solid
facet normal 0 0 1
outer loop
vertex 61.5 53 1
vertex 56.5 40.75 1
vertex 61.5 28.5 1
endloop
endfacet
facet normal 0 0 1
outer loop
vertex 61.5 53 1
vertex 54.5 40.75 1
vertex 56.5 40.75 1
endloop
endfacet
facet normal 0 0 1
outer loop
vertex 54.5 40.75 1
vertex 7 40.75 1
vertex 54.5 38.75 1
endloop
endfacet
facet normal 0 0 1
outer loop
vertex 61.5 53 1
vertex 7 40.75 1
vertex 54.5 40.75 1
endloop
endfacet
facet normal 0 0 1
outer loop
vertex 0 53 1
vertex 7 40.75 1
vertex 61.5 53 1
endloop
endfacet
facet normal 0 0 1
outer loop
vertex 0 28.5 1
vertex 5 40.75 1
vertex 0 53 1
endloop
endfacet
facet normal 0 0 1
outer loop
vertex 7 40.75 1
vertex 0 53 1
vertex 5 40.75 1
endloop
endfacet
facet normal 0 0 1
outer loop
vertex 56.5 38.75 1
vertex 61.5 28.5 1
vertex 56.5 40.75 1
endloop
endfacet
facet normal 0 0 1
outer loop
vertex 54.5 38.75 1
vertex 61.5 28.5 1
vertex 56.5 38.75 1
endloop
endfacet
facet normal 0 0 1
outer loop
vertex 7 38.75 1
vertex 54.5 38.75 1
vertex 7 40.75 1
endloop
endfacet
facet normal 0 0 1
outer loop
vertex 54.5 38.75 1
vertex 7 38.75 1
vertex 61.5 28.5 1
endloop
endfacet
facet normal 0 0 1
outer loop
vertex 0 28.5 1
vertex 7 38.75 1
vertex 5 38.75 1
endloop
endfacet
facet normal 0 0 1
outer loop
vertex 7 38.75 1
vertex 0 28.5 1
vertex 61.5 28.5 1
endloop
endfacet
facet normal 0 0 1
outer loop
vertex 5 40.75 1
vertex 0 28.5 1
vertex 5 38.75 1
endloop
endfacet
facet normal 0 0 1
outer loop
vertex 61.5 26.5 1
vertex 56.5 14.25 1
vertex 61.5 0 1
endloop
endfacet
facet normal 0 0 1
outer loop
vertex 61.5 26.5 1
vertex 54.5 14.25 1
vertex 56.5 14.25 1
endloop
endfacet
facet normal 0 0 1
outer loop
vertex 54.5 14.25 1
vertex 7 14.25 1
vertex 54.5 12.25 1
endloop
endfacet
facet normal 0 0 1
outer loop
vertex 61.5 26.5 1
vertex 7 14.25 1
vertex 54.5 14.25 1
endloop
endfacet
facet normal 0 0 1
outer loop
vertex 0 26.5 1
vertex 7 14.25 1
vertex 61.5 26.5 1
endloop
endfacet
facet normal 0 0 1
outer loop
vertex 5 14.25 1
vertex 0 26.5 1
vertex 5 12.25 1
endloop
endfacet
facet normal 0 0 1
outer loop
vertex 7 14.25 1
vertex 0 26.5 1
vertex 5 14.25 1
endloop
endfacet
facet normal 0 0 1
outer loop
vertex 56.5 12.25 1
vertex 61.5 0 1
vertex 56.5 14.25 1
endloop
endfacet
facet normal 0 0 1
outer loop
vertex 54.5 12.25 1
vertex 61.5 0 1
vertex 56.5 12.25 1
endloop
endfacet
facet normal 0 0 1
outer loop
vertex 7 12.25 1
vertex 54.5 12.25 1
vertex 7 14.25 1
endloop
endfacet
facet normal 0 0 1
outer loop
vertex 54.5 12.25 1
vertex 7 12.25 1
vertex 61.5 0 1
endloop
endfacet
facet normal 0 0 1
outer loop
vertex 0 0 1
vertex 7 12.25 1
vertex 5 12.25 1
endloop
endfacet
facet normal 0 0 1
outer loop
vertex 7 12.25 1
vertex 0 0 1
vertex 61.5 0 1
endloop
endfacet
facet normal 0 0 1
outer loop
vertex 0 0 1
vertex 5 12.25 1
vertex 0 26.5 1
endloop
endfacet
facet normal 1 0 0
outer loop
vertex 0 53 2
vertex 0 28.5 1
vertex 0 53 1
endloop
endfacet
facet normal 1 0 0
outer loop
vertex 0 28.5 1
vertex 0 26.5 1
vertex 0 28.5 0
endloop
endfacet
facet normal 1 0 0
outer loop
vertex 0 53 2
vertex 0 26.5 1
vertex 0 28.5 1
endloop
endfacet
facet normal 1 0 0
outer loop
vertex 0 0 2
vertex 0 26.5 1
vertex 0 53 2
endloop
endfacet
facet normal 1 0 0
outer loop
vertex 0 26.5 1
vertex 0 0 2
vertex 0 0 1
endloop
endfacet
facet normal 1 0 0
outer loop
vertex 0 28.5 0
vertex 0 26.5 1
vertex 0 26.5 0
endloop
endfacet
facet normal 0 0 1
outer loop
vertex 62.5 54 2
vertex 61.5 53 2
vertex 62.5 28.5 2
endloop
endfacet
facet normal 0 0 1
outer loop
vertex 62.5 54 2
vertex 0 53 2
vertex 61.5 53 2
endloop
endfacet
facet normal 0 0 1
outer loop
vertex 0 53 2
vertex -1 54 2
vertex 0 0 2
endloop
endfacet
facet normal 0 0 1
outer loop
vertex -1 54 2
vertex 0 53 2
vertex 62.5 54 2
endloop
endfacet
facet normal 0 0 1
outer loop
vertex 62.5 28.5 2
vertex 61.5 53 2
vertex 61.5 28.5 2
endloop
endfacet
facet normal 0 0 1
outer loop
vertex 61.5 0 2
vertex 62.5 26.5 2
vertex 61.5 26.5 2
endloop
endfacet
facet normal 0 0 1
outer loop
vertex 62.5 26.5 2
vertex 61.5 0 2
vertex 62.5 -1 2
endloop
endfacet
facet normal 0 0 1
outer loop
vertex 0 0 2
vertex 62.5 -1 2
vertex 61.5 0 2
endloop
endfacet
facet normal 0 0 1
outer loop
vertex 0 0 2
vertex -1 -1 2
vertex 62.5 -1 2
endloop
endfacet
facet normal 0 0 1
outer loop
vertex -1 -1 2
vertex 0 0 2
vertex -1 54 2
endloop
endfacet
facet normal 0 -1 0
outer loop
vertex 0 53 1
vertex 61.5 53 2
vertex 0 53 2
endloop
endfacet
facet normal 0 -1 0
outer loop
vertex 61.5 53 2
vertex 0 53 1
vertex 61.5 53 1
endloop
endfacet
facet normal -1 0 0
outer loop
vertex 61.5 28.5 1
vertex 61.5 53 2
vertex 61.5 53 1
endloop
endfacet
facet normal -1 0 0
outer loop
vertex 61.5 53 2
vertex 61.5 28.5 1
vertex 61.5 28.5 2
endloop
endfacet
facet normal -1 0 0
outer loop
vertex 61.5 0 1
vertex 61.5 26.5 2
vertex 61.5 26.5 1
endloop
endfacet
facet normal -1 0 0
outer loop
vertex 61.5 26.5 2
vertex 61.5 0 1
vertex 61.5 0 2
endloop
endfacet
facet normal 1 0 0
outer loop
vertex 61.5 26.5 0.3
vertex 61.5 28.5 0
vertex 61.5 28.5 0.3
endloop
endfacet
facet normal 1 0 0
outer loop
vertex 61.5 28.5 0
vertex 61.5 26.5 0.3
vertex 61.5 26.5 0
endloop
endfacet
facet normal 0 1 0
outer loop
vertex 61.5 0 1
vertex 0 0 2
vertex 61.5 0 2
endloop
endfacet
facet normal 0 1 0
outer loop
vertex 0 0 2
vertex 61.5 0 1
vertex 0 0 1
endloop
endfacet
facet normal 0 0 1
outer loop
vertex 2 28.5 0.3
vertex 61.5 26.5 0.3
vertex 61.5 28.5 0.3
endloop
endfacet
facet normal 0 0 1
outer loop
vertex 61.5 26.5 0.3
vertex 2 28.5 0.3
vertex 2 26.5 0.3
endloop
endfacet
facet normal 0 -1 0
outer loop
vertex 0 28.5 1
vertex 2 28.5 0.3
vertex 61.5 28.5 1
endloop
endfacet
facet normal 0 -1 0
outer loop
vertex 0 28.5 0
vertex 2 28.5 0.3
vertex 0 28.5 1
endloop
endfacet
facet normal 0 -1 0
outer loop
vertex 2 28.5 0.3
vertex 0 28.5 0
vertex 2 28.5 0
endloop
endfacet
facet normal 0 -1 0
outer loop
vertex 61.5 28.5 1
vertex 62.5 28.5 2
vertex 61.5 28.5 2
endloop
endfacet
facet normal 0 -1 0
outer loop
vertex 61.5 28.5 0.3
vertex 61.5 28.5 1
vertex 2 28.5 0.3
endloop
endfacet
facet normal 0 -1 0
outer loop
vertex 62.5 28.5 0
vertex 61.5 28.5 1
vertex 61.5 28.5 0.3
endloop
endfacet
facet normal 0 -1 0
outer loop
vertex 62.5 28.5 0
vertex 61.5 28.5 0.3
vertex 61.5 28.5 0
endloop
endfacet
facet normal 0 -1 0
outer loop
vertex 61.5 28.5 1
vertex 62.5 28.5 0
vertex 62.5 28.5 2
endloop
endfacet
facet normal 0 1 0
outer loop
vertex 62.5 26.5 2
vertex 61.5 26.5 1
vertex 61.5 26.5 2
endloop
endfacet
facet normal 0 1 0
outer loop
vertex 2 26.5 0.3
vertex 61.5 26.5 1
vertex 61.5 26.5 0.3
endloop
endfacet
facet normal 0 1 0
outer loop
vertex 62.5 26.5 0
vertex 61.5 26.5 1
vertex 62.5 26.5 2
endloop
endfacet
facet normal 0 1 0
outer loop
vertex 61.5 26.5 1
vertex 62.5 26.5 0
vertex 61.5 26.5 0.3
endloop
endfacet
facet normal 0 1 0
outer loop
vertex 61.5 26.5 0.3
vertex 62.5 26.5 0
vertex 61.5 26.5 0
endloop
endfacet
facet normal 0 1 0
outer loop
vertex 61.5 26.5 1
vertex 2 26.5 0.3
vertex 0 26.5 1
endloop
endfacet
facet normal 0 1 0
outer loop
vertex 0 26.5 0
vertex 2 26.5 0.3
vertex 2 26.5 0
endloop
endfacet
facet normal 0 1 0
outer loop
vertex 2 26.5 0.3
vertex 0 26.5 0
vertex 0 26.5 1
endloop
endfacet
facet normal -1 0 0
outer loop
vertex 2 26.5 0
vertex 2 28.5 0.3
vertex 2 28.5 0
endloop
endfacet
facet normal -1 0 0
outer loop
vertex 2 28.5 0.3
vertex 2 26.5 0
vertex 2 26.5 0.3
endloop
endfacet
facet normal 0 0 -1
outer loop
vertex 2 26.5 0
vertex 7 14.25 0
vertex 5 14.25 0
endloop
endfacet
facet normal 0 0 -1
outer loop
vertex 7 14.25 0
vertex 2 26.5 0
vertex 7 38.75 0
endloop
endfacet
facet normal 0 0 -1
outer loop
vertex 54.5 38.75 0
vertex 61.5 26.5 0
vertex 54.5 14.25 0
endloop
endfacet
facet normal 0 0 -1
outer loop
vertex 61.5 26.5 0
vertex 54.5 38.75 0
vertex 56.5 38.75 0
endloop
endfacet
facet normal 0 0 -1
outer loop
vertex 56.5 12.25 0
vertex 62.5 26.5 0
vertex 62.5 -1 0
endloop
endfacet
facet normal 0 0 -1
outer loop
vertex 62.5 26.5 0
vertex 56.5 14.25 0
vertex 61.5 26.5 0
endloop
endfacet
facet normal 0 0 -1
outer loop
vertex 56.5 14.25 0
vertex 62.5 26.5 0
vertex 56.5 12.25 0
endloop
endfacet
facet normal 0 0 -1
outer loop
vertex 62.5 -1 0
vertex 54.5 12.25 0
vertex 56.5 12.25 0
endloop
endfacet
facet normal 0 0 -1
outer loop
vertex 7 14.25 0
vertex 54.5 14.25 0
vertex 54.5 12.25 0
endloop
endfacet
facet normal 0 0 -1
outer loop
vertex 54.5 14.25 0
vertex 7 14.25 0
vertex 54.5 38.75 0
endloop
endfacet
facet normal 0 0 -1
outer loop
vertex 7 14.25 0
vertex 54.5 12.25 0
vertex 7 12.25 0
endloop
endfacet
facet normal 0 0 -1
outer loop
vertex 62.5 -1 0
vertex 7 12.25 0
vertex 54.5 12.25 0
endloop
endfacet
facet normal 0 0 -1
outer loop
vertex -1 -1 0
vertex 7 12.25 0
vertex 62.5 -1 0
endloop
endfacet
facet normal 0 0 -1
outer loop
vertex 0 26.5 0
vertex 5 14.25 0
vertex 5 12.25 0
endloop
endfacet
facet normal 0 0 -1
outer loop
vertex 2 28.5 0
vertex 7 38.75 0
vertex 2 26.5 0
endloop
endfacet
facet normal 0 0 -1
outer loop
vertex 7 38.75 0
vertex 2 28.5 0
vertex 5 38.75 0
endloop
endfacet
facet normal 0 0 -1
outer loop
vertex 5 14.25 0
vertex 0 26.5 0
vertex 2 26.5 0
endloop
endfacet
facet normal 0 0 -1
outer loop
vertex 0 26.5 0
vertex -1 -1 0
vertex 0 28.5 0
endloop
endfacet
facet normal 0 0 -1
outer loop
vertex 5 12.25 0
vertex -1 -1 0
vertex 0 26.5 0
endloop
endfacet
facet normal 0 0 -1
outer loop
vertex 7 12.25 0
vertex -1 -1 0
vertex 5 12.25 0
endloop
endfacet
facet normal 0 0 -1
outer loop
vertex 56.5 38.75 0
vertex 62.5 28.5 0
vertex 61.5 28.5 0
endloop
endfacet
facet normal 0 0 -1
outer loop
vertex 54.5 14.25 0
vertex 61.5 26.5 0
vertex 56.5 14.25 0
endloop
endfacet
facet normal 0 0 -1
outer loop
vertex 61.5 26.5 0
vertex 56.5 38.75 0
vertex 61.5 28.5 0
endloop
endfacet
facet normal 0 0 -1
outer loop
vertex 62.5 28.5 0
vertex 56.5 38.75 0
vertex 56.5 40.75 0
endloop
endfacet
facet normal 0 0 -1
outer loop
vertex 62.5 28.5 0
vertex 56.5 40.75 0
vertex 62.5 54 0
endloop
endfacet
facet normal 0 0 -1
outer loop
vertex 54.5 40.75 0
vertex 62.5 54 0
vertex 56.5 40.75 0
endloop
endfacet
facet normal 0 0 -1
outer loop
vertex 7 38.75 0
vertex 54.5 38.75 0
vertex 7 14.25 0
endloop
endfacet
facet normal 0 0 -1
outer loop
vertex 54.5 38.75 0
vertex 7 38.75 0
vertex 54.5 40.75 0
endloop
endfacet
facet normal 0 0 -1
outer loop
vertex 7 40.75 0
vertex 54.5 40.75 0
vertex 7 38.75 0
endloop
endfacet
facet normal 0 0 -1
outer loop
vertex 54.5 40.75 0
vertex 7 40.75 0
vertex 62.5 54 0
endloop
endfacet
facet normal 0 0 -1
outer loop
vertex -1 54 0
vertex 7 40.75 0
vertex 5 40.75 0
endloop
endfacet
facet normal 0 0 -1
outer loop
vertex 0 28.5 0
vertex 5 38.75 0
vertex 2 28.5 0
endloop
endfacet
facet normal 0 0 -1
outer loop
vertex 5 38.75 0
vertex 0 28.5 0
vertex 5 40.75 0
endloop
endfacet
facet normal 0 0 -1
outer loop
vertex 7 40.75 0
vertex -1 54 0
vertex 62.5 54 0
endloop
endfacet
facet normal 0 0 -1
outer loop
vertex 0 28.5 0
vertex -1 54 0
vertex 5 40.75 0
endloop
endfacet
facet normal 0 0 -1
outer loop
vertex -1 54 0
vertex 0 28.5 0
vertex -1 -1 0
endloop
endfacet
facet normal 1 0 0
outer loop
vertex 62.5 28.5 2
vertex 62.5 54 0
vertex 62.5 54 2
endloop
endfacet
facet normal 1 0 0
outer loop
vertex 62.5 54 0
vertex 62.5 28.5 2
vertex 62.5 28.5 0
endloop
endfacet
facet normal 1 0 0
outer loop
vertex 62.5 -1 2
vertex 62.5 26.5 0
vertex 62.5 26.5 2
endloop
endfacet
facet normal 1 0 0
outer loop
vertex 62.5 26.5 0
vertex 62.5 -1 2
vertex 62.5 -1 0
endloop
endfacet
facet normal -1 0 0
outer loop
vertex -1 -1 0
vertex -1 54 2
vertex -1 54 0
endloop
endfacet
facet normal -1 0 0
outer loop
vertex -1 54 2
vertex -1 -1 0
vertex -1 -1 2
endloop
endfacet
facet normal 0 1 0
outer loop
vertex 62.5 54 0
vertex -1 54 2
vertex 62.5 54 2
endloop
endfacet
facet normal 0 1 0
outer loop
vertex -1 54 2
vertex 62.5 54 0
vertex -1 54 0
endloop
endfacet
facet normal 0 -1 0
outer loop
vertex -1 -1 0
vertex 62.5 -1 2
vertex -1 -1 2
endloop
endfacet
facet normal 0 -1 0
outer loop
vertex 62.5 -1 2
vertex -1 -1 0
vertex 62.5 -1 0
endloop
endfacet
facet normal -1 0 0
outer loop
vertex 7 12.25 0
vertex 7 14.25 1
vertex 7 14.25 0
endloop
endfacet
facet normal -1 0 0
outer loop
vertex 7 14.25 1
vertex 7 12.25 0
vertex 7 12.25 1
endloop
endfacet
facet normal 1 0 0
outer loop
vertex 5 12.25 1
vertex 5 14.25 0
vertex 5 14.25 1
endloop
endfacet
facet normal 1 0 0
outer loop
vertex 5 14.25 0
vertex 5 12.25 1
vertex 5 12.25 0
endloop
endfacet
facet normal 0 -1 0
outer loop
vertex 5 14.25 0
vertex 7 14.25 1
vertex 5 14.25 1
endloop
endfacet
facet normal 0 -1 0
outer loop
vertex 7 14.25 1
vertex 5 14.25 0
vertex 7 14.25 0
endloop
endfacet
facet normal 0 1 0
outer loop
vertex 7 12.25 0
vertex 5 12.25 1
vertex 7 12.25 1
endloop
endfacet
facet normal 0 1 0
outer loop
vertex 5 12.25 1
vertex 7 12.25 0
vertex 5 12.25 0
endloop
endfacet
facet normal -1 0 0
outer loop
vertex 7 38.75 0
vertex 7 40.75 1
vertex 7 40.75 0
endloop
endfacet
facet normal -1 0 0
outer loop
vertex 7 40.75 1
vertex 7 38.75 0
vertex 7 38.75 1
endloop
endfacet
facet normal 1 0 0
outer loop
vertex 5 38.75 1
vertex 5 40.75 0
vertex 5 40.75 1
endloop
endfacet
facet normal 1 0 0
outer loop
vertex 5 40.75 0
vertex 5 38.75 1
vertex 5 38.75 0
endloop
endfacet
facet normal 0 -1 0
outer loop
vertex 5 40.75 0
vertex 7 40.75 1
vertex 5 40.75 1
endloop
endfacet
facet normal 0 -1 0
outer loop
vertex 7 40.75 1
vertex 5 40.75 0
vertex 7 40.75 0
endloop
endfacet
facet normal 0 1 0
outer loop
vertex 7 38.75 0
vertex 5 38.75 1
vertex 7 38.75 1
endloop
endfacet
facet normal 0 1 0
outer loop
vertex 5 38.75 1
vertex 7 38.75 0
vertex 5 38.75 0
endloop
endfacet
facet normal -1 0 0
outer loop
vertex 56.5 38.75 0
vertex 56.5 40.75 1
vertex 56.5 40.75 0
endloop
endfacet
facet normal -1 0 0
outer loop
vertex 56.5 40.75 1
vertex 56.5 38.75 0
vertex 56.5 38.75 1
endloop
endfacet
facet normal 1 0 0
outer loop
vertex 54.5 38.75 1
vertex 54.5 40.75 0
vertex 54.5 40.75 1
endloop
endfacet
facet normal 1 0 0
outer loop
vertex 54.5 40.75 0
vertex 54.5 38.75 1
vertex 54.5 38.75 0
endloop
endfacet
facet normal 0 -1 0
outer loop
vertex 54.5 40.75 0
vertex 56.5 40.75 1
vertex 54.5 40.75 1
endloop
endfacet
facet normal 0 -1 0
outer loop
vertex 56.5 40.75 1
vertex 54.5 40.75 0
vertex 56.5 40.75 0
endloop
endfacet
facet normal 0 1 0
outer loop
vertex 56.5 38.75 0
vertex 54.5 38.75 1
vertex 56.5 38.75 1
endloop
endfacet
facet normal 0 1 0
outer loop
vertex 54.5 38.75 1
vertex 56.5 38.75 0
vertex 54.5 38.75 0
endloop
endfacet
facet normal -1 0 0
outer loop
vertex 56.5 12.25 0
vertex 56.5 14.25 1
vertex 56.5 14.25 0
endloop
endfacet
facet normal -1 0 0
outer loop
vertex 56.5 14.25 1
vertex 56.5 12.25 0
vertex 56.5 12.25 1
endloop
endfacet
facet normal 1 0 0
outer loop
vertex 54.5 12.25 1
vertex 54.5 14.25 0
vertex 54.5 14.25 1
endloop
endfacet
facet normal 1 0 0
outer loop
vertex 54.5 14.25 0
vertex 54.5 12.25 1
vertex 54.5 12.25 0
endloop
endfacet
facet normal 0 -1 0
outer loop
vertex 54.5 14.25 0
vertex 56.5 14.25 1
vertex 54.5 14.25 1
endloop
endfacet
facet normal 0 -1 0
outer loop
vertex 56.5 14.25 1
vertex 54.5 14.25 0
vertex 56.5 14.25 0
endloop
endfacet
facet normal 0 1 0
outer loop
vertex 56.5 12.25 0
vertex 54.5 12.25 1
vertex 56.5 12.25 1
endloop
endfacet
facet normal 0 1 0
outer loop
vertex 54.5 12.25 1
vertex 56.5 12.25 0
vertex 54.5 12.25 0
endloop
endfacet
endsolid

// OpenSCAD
solar_panel_x = 20.5;
solar_panel_y = 53;
separator_width = 1;

parallel_group_count = 3;
series_group_count = 3;

center_tap_y = solar_panel_y / 2;
top_support_hole_y = 3 * solar_panel_y / 4;
bottom_support_hole_y = solar_panel_y /4;
edge_offset = 5;
center_tap_groove_width = 2;

difference(){

linear_extrude(2)
translate([-separator_width, -separator_width])
square([parallel_group_count*solar_panel_x + 2 * separator_width, solar_panel_y + 2 * separator_width]);
union(){
translate([0, 0, 1])
linear_extrude(1)
square([parallel_group_count*solar_panel_x, solar_panel_y]);

translate([0, center_tap_y, 0.3])
cube([solar_panel_x * parallel_group_count, center_tap_groove_width, 1]);

translate([0, center_tap_y])
cube([2,2,2]);
translate([parallel_group_count * solar_panel_x, center_tap_y, 0])
cube([1,2,2]);
}
translate([edge_offset, bottom_support_hole_y - 1])
cube(2,2,2);

translate([edge_offset, top_support_hole_y - 1])
cube(2,2,2);

translate([parallel_group_count * solar_panel_x - 2 - edge_offset, top_support_hole_y - 1])
cube(2,2,2);
translate([parallel_group_count * solar_panel_x - 2 - edge_offset, bottom_support_hole_y - 1])
cube(2,2,2);
}
